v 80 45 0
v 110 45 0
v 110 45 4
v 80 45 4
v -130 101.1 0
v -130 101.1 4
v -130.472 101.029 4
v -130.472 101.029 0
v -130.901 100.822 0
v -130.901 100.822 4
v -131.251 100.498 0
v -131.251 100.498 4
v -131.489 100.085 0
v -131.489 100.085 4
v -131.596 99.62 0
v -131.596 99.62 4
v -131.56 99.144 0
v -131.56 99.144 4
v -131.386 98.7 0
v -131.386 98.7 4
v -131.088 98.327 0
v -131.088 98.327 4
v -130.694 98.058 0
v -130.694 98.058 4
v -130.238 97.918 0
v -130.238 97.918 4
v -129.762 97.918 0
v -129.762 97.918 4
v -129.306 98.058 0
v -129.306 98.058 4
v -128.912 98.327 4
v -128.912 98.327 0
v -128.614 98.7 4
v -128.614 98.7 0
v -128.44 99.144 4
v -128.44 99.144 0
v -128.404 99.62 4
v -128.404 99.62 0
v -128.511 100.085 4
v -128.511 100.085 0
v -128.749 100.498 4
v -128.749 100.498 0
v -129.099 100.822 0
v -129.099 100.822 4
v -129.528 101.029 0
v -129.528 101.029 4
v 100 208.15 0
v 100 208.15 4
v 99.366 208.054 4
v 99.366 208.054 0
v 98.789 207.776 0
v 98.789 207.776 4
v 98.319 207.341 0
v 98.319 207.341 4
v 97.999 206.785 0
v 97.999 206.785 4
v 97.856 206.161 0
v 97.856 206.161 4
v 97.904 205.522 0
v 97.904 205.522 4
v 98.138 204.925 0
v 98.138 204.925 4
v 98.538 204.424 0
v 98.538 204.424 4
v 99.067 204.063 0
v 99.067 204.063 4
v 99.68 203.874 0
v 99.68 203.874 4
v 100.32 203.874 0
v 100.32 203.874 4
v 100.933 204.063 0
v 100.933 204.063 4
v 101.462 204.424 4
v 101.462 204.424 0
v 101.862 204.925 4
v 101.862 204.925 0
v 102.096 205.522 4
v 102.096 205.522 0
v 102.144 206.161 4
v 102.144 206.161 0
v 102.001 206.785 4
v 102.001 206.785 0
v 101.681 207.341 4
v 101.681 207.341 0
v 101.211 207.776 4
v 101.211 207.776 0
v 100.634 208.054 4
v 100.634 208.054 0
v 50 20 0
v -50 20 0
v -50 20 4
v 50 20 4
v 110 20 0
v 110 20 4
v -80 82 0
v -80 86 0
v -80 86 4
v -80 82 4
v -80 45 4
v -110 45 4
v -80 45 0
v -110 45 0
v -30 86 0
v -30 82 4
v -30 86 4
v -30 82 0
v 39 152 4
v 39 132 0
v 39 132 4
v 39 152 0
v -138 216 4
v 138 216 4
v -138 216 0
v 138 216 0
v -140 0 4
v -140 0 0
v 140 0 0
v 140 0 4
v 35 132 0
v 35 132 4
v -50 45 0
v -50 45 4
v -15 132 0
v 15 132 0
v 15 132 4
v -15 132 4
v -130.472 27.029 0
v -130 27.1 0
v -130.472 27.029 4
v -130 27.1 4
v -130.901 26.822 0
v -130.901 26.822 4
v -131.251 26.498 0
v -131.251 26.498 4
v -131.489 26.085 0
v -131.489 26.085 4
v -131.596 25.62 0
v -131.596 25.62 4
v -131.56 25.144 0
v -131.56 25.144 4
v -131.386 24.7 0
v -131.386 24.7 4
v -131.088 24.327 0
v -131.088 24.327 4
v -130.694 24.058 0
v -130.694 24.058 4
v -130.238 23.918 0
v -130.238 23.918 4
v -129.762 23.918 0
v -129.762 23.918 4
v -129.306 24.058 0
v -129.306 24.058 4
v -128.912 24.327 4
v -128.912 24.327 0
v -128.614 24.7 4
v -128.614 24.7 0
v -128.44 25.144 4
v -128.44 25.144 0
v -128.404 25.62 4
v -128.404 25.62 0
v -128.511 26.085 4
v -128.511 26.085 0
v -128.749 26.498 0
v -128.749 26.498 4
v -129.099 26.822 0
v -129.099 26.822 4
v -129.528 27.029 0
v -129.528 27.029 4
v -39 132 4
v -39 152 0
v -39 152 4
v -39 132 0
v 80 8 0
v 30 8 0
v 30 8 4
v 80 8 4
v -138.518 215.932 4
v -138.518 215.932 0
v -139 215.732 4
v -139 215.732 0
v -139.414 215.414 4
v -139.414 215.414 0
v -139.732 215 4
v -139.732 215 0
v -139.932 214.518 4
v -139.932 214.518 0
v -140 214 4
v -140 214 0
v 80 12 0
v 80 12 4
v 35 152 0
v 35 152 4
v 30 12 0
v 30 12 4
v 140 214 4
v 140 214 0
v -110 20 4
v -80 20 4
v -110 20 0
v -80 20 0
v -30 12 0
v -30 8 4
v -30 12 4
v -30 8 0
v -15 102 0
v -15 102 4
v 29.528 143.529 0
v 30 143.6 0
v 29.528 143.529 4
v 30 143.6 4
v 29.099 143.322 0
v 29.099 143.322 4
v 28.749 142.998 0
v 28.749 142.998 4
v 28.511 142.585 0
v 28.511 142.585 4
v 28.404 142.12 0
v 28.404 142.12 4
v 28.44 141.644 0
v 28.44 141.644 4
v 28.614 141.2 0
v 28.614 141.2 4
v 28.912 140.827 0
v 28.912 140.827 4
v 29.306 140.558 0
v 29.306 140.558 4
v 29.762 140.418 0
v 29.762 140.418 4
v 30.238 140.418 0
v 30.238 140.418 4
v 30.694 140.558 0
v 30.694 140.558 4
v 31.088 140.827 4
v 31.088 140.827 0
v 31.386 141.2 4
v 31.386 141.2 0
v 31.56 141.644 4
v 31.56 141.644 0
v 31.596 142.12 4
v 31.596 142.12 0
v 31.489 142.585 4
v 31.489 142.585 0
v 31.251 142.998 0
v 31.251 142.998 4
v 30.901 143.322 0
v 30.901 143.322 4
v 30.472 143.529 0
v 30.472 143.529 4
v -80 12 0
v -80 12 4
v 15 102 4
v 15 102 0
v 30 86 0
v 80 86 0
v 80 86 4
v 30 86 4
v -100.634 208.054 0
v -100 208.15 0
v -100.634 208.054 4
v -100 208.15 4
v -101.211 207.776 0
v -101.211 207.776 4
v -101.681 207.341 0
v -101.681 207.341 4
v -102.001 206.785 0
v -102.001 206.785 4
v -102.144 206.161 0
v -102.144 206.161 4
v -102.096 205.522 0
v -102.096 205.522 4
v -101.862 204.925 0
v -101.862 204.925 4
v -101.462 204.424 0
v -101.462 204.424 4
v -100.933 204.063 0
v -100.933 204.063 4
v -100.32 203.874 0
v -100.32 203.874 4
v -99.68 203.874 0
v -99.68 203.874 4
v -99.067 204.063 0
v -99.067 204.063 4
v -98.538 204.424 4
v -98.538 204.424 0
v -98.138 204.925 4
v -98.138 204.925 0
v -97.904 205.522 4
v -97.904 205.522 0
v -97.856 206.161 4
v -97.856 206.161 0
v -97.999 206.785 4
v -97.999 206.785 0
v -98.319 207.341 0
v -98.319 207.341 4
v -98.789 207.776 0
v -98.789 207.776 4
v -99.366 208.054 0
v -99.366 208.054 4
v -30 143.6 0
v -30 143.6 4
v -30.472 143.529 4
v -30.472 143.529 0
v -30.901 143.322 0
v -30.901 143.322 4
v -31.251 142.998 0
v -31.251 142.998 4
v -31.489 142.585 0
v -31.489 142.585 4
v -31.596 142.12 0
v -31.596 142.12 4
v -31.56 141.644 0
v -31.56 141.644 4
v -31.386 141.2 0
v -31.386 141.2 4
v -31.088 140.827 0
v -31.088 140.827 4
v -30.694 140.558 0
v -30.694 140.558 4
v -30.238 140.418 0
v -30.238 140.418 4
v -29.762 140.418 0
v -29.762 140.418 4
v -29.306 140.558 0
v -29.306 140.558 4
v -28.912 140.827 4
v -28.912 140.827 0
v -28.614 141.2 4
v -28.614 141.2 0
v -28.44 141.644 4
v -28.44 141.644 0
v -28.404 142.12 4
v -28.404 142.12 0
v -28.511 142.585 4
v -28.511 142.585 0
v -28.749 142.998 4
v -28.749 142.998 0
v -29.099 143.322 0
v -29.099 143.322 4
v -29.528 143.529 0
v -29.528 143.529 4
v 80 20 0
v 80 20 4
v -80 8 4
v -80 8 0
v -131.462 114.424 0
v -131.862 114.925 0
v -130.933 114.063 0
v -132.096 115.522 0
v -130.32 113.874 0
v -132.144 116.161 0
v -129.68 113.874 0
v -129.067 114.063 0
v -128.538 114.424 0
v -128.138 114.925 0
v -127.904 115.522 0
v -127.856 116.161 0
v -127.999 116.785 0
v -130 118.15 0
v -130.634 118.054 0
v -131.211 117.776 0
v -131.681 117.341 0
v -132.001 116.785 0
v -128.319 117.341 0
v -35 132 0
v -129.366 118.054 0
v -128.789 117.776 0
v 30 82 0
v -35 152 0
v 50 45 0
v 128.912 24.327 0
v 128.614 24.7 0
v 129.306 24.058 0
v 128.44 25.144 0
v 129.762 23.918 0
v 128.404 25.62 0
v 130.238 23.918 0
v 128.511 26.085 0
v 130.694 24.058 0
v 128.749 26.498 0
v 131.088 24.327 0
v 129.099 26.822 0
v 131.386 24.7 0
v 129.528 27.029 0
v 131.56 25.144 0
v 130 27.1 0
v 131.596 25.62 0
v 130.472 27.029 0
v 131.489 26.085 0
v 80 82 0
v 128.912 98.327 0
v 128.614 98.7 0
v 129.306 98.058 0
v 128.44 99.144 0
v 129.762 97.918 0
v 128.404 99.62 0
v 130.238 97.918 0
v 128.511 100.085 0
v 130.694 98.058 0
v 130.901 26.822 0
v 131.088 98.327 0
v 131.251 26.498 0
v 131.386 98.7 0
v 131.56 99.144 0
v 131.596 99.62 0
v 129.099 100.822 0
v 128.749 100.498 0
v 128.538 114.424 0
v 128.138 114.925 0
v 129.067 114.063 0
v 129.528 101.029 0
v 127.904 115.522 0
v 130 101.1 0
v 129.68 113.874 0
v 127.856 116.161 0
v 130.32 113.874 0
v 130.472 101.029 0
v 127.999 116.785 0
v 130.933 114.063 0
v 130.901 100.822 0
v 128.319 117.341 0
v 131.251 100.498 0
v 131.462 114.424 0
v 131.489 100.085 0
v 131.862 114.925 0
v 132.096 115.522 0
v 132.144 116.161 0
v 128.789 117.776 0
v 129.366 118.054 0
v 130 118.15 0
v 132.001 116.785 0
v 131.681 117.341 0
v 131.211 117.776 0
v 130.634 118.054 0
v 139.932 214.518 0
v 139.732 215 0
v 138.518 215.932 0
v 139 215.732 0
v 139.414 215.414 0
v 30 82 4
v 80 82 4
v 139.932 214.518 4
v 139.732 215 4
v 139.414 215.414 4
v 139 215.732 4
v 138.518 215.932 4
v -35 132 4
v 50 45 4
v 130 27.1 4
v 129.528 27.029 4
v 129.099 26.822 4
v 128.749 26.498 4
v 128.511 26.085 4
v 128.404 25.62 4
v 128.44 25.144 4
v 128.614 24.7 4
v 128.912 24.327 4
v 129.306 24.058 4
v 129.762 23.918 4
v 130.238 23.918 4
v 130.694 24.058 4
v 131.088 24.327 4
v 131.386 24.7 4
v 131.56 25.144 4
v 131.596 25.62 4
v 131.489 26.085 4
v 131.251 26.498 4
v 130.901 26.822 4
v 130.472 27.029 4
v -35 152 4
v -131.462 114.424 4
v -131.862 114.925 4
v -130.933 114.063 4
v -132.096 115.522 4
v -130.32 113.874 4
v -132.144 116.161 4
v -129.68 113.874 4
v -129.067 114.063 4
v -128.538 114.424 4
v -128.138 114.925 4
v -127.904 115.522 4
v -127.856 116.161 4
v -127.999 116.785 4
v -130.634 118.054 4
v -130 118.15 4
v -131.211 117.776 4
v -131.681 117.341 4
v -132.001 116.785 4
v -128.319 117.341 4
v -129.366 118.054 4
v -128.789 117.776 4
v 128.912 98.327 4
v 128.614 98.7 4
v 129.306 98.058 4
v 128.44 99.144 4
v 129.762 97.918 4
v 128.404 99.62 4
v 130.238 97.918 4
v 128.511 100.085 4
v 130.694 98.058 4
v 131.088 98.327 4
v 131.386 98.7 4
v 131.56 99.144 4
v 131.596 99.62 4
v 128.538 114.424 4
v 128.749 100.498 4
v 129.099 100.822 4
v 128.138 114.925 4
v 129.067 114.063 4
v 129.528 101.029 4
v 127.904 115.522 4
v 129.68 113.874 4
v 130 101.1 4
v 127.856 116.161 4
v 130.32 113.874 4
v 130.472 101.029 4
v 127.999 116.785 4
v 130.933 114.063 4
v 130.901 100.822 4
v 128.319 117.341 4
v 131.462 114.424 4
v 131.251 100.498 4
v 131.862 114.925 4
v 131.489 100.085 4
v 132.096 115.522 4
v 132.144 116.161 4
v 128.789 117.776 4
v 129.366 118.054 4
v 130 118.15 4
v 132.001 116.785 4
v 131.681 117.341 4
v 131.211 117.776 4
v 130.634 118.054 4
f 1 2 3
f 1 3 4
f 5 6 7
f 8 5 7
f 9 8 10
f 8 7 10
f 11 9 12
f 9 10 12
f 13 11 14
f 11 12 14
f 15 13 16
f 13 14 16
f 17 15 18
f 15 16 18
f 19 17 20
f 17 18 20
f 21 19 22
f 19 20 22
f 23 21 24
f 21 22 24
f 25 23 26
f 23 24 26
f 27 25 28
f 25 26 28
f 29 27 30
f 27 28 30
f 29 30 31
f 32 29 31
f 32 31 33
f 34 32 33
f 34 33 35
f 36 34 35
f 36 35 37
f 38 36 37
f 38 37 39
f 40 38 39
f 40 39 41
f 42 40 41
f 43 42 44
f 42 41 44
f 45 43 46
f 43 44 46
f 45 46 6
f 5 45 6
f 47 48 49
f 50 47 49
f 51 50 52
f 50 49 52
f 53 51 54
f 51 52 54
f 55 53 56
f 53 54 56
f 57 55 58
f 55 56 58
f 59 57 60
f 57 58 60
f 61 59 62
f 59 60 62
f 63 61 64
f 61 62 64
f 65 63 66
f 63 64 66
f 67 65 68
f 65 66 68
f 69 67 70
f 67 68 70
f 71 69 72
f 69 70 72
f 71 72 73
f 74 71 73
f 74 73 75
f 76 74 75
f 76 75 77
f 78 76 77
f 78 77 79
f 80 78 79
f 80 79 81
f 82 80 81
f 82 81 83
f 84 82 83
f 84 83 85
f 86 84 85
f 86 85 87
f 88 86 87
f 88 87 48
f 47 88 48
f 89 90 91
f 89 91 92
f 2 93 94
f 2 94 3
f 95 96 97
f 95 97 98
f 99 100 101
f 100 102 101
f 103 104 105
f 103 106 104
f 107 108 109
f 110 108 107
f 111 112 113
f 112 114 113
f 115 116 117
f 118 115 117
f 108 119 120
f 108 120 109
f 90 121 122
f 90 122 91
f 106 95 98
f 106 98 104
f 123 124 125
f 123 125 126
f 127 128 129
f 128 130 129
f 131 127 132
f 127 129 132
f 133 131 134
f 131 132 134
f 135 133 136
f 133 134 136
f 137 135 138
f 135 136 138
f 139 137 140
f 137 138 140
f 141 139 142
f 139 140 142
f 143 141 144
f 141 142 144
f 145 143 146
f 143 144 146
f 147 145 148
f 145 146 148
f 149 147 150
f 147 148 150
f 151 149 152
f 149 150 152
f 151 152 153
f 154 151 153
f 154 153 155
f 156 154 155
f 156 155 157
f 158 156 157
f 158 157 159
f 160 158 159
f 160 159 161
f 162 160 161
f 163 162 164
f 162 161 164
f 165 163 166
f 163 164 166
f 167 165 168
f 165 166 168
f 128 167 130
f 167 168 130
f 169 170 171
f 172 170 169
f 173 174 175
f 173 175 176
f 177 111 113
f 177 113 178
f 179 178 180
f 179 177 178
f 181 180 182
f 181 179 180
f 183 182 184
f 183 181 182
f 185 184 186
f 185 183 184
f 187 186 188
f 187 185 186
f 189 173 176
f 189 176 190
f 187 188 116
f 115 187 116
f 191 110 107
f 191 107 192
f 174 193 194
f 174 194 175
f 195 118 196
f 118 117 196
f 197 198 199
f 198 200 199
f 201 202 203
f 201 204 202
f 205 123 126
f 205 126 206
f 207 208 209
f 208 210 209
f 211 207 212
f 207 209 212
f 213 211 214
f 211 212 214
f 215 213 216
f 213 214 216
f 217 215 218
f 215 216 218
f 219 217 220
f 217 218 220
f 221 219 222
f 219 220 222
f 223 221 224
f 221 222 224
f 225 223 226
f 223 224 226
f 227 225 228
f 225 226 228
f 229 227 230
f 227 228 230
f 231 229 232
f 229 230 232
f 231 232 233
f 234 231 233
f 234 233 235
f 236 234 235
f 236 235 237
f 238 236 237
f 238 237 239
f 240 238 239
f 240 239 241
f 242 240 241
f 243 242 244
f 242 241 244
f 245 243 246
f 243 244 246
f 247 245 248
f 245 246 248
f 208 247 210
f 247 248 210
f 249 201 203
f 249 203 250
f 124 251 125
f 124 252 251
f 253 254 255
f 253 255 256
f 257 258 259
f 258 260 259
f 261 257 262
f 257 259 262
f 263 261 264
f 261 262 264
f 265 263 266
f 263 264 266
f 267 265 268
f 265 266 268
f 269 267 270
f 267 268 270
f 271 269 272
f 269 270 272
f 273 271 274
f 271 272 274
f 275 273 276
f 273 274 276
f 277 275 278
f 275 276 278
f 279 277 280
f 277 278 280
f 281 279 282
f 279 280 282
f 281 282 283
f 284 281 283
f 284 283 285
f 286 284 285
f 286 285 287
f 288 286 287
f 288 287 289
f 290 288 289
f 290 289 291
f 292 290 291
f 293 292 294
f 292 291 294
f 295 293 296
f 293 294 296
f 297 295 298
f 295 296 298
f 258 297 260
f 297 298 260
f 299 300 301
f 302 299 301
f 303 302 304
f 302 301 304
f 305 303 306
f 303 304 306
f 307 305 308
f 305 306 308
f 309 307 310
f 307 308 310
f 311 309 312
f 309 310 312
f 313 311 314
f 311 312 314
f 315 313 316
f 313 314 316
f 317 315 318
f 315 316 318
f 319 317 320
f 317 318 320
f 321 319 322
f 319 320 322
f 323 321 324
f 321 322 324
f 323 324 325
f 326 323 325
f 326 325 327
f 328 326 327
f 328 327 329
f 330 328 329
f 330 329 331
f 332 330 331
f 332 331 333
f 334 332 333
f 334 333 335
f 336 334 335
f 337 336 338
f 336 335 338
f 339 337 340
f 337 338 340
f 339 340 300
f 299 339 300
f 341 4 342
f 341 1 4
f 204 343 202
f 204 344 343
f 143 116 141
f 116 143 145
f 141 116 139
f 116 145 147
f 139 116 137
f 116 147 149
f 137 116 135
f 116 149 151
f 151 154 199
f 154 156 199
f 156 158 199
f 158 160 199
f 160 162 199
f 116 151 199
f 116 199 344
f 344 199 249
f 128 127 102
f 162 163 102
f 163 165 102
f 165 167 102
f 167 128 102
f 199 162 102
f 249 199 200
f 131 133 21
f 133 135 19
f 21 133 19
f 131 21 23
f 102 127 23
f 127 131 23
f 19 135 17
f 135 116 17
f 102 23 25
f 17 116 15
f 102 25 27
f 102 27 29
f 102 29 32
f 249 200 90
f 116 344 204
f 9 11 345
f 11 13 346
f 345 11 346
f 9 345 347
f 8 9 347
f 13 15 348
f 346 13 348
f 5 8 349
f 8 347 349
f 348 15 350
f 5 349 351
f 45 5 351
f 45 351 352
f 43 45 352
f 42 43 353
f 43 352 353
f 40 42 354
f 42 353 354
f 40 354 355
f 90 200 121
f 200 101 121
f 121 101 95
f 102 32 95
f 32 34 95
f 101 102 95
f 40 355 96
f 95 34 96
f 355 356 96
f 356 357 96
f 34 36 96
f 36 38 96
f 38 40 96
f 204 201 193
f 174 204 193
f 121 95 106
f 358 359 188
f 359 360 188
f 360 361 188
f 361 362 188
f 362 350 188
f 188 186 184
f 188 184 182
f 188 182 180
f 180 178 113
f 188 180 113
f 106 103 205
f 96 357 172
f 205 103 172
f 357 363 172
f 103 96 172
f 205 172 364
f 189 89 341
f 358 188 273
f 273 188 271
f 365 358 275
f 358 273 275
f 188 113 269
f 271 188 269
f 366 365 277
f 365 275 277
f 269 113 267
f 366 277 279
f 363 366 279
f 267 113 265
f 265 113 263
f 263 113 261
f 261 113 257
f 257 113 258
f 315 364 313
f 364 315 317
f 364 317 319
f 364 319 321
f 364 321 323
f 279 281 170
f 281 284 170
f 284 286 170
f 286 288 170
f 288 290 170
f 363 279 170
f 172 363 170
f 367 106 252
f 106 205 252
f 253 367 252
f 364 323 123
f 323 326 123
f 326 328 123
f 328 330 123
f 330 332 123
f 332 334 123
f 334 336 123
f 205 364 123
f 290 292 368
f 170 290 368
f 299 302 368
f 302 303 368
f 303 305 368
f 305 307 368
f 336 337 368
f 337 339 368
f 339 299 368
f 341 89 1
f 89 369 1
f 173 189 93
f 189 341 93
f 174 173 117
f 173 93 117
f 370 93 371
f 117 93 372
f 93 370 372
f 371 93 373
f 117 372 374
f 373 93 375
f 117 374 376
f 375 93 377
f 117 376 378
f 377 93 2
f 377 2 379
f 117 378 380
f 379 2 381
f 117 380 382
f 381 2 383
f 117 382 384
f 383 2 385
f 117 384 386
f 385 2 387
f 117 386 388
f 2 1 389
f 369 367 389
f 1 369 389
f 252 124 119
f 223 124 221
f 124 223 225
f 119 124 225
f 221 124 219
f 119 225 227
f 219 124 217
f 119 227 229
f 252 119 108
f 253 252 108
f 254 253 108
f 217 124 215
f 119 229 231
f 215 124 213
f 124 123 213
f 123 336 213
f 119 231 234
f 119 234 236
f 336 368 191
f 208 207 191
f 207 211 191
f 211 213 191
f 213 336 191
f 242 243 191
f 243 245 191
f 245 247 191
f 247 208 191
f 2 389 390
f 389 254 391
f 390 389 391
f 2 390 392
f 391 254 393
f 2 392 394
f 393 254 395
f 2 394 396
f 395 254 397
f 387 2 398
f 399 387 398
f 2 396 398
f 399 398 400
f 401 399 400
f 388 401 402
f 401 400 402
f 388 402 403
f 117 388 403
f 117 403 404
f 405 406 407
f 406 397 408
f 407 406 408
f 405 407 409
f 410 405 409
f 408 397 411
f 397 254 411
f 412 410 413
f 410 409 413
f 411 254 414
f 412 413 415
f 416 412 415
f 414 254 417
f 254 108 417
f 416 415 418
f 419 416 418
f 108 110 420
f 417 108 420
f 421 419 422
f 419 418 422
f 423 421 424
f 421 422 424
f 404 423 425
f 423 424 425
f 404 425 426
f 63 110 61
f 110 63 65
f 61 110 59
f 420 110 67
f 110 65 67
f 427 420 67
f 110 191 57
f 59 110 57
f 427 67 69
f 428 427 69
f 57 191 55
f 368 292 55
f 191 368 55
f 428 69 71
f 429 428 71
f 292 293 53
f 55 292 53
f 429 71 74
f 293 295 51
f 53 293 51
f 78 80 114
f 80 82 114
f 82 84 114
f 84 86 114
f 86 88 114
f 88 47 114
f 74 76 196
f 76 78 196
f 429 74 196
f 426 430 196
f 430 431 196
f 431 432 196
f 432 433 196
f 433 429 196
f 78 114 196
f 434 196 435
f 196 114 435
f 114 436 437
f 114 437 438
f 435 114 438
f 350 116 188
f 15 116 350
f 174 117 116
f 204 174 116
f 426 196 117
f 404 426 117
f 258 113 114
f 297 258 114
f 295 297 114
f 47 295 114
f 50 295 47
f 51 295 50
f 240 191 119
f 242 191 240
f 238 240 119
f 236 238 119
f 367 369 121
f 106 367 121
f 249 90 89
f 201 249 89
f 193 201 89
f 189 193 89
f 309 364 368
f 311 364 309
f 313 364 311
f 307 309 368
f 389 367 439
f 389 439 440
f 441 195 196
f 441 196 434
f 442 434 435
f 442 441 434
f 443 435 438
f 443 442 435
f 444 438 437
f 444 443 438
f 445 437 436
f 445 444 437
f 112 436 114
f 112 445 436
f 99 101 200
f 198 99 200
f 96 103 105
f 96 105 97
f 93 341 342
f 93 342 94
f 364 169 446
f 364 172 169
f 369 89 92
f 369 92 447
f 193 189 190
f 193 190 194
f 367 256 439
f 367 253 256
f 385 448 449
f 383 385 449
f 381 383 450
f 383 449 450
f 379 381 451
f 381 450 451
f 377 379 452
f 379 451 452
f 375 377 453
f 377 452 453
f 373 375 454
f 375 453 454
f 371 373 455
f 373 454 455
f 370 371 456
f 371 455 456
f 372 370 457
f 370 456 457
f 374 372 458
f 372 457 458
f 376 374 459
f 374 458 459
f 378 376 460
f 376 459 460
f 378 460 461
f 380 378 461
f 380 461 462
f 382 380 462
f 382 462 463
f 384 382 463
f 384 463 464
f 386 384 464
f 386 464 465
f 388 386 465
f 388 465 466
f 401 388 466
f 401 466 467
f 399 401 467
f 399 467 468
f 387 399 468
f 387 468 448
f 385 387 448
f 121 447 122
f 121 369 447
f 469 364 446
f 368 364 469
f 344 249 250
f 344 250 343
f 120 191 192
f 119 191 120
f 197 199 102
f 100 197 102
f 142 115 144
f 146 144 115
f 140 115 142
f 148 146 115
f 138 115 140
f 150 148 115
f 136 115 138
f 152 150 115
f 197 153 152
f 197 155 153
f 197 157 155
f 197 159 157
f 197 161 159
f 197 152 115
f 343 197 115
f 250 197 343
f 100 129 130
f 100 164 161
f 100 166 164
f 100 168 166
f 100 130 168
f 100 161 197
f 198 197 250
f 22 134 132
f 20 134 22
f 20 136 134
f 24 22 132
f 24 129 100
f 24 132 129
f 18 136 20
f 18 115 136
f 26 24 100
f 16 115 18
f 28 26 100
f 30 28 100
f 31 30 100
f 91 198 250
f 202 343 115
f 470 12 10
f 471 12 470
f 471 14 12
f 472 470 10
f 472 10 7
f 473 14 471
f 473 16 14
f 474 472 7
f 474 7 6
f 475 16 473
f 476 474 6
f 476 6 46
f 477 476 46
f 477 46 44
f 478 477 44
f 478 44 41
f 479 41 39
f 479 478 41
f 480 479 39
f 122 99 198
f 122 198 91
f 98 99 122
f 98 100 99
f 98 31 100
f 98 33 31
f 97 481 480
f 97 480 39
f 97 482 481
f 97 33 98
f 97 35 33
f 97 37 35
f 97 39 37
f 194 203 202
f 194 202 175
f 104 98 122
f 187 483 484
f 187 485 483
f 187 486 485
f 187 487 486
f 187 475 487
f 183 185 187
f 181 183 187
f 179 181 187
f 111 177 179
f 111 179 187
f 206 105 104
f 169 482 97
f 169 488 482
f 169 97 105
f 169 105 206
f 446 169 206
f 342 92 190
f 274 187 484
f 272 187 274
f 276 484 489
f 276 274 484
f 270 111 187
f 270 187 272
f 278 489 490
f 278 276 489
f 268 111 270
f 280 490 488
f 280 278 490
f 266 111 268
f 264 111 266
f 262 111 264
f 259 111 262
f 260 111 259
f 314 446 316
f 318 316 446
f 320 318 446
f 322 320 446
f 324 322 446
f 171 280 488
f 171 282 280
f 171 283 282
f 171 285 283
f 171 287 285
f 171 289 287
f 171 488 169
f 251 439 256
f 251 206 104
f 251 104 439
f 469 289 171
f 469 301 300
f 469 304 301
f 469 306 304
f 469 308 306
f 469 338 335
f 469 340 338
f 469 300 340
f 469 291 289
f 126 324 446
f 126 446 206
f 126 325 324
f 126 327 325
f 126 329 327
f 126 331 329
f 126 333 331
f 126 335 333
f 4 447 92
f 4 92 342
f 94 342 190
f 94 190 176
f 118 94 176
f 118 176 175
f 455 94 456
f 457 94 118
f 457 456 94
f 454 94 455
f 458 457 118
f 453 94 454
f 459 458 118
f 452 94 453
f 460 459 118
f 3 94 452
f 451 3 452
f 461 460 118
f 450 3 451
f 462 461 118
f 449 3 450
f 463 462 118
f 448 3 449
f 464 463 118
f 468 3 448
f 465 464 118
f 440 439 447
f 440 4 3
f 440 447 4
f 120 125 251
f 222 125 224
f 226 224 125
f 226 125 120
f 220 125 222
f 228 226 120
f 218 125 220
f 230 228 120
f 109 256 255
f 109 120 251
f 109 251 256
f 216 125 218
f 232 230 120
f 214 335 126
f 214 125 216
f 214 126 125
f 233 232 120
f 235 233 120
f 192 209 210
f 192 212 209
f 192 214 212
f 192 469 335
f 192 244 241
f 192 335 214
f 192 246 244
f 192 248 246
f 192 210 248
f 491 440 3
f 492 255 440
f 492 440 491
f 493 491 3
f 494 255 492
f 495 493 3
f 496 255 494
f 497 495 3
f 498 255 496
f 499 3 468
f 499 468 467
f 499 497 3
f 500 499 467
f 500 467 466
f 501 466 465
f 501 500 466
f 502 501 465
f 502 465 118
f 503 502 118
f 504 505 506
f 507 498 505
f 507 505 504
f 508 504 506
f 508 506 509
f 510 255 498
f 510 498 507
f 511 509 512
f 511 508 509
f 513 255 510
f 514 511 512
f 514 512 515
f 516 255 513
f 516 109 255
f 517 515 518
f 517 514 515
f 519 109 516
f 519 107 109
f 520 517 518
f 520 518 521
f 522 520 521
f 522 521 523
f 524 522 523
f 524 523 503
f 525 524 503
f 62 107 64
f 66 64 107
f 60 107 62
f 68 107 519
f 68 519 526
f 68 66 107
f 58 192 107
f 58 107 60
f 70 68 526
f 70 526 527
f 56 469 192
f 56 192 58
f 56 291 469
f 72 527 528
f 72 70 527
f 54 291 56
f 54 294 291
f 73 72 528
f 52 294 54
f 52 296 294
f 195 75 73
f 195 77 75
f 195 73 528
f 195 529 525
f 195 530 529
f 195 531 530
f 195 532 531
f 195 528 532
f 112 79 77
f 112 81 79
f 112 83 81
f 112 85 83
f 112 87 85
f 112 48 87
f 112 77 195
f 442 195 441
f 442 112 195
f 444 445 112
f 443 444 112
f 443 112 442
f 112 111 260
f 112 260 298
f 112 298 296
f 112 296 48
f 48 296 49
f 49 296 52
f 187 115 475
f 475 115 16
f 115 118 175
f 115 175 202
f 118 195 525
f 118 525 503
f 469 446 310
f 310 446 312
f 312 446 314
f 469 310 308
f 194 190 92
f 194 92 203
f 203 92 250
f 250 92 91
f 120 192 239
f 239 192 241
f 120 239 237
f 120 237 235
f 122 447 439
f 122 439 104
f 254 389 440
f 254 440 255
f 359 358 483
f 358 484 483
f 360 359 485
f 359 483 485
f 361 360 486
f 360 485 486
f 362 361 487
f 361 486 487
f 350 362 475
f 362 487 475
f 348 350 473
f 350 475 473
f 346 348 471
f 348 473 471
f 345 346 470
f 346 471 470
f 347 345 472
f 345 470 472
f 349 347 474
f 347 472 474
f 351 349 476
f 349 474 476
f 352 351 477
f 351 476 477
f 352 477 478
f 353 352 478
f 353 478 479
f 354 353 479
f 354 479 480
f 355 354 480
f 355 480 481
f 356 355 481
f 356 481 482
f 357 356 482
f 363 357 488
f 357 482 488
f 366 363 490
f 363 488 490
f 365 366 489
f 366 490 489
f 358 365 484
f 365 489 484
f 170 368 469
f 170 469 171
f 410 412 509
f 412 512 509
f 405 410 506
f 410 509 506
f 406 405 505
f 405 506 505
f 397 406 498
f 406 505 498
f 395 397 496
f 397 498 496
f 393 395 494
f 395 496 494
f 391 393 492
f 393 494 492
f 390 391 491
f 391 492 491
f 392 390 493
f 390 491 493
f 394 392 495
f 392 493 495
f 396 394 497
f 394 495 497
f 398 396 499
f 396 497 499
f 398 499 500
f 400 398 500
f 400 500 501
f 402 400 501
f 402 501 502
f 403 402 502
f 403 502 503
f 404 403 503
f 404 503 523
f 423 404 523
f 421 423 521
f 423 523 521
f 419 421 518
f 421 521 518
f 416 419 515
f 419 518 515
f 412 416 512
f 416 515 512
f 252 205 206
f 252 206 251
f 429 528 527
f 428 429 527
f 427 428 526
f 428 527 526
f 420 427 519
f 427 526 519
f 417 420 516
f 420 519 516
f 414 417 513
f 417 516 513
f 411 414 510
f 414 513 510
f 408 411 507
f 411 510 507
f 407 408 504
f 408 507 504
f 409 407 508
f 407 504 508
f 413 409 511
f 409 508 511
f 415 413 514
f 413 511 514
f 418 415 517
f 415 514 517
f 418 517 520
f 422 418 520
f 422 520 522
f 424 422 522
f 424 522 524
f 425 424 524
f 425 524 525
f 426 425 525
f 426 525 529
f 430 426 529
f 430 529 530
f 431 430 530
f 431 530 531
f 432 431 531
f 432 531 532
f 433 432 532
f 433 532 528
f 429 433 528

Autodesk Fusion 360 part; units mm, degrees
sketch "スケッチ1" plane through (0, 0, 0) normal (0, 0, 1) x (1, 0, 0)
  line L0 (140, 0) -> (140, 216)
  line L1 (140, 216) -> (-140, 216)
  line L2 (-140, 216) -> (-140, 0)
  line L3 (-39, 132) -> (-35, 132)
  line L4 (-35, 132) -> (-35, 152)
  line L5 (-35, 152) -> (-39, 152)
  line L6 (-39, 152) -> (-39, 132)
  line L7 (35, 132) -> (39, 132)
  line L8 (39, 132) -> (39, 152)
  line L9 (39, 152) -> (35, 152)
  line L10 (35, 152) -> (35, 132)
  line L11 (-140, 0) -> (140, 0)
  line L12 (-35, 142) -> (-30, 142)
  line L13 (35, 142) -> (30, 142)
  line L14 (-130, 116) -> (-130, 206)
  line L15 (-130, 206) -> (130, 206)
  line L16 (130, 206) -> (130, 116)
  line L17 (15, 132) -> (-15, 132)
  line L18 (-15, 132) -> (-15, 102)
  line L19 (-15, 102) -> (15, 102)
  line L20 (15, 102) -> (15, 132)
  line L21 (15, 132) -> (-15, 102) construction
  line L22 (-15, 132) -> (15, 102) construction
  line L23 (-140, 82) -> (140, 82)
  line L24 (-80, 82) -> (-30, 82)
  line L25 (-30, 82) -> (-30, 86)
  line L26 (-30, 86) -> (-80, 86)
  line L27 (-80, 86) -> (-80, 82)
  line L28 (30, 82) -> (80, 82)
  line L29 (80, 82) -> (80, 86)
  line L30 (80, 86) -> (30, 86)
  line L31 (30, 86) -> (30, 82)
  line L32 (-130, 0) -> (-130, 25.5)
  line L33 (130, 0) -> (130, 25.5)
  line L34 (-50, 20) -> (50, 20)
  line L35 (50, 20) -> (50, 45)
  line L36 (50, 45) -> (-50, 45)
  line L37 (-50, 45) -> (-50, 20)
  line L38 (80, 20) -> (110, 20)
  line L39 (110, 20) -> (110, 45)
  line L40 (110, 45) -> (80, 45)
  line L41 (80, 45) -> (80, 20)
  line L42 (-80, 8) -> (-30, 8)
  line L43 (-30, 8) -> (-30, 12)
  line L44 (-30, 12) -> (-80, 12)
  line L45 (-80, 12) -> (-80, 8)
  line L46 (30, 8) -> (80, 8)
  line L47 (80, 8) -> (80, 12)
  line L48 (80, 12) -> (30, 12)
  line L49 (30, 12) -> (30, 8)
  line L50 (-80, 20) -> (-110, 20)
  line L51 (-110, 20) -> (-110, 45)
  line L52 (-110, 45) -> (-80, 45)
  line L53 (-80, 45) -> (-80, 20)
  line L54 (-130, 82) -> (-130, 99.5)
  line L55 (130, 82) -> (130, 99.5)
  point P0 (0, 216)
  point P1 (-100, 206)
  point P2 (100, 206)
  point P3 (0, 117)
  point P4 (0, 20)
  dimension "d3" = 4
  dimension "d5" = 20
  dimension "d10" = 216
  dimension "d20" = 280
  dimension "d24" = 5
  dimension "d25" = 5
  dimension "d26" = 10
  dimension "d27" = 10
  dimension "d28" = 10
  dimension "d29" = 90
  dimension "d30" = 100
  dimension "d31" = 100
  dimension "d45" = 30
  dimension "d46" = 30
  dimension "d51" = 20
  dimension "d52" = 50
  dimension "d53" = 50
  dimension "d54" = 4
  dimension "d57" = 10
  dimension "d58" = 10
  dimension "d59" = 25.5
  dimension "d60" = 25.5
  dimension "d63" = 25
  dimension "d67" = 8
  dimension "d68" = 30
  dimension "d69" = 30
  dimension "d70" = 50
  dimension "d71" = 50
  dimension "d72" = 4
  dimension "d73" = 20
  dimension "d74" = 100
  dimension "d75" = 30
  dimension "d76" = 30
  dimension "d77" = 70
  dimension "d78" = 17.5
  dimension "d79" = 50
  dimension "d80" = 35
  dimension "d81" = 35
  dimension "d82" = 30
  dimension "d83" = 30
extrude "押し出し1" add sketch "スケッチ1" along normal blind 4 contours L0 L2 L11 L23 L24 L28 | L0 L1 L2 L23 L25 L26 L27 L29 L30 L31
hole "穴1" at (-30, 142, 0) at (30, 142, 0) at (-130, 25.5, 0) at (130, 25.5, 0) at (130, 99.5, 0) at (-130, 99.5, 0) direction (0, 0, 1) diameter 3.2 depth 35 tip angle 118
hole "穴2" at (-130, 116, 0) at (-100, 206, 0) at (100, 206, 0) at (130, 116, 0) direction (0, 0, 1) diameter 4.3 depth 35 tip angle 118
fillet "フィレット1" radius 2 2 edges at (140, 216, 2) (-140, 216, 2)
equation "d59 = 13.5 mm + 12 mm"
equation "d60 = 13.5 mm + 12 mm"
